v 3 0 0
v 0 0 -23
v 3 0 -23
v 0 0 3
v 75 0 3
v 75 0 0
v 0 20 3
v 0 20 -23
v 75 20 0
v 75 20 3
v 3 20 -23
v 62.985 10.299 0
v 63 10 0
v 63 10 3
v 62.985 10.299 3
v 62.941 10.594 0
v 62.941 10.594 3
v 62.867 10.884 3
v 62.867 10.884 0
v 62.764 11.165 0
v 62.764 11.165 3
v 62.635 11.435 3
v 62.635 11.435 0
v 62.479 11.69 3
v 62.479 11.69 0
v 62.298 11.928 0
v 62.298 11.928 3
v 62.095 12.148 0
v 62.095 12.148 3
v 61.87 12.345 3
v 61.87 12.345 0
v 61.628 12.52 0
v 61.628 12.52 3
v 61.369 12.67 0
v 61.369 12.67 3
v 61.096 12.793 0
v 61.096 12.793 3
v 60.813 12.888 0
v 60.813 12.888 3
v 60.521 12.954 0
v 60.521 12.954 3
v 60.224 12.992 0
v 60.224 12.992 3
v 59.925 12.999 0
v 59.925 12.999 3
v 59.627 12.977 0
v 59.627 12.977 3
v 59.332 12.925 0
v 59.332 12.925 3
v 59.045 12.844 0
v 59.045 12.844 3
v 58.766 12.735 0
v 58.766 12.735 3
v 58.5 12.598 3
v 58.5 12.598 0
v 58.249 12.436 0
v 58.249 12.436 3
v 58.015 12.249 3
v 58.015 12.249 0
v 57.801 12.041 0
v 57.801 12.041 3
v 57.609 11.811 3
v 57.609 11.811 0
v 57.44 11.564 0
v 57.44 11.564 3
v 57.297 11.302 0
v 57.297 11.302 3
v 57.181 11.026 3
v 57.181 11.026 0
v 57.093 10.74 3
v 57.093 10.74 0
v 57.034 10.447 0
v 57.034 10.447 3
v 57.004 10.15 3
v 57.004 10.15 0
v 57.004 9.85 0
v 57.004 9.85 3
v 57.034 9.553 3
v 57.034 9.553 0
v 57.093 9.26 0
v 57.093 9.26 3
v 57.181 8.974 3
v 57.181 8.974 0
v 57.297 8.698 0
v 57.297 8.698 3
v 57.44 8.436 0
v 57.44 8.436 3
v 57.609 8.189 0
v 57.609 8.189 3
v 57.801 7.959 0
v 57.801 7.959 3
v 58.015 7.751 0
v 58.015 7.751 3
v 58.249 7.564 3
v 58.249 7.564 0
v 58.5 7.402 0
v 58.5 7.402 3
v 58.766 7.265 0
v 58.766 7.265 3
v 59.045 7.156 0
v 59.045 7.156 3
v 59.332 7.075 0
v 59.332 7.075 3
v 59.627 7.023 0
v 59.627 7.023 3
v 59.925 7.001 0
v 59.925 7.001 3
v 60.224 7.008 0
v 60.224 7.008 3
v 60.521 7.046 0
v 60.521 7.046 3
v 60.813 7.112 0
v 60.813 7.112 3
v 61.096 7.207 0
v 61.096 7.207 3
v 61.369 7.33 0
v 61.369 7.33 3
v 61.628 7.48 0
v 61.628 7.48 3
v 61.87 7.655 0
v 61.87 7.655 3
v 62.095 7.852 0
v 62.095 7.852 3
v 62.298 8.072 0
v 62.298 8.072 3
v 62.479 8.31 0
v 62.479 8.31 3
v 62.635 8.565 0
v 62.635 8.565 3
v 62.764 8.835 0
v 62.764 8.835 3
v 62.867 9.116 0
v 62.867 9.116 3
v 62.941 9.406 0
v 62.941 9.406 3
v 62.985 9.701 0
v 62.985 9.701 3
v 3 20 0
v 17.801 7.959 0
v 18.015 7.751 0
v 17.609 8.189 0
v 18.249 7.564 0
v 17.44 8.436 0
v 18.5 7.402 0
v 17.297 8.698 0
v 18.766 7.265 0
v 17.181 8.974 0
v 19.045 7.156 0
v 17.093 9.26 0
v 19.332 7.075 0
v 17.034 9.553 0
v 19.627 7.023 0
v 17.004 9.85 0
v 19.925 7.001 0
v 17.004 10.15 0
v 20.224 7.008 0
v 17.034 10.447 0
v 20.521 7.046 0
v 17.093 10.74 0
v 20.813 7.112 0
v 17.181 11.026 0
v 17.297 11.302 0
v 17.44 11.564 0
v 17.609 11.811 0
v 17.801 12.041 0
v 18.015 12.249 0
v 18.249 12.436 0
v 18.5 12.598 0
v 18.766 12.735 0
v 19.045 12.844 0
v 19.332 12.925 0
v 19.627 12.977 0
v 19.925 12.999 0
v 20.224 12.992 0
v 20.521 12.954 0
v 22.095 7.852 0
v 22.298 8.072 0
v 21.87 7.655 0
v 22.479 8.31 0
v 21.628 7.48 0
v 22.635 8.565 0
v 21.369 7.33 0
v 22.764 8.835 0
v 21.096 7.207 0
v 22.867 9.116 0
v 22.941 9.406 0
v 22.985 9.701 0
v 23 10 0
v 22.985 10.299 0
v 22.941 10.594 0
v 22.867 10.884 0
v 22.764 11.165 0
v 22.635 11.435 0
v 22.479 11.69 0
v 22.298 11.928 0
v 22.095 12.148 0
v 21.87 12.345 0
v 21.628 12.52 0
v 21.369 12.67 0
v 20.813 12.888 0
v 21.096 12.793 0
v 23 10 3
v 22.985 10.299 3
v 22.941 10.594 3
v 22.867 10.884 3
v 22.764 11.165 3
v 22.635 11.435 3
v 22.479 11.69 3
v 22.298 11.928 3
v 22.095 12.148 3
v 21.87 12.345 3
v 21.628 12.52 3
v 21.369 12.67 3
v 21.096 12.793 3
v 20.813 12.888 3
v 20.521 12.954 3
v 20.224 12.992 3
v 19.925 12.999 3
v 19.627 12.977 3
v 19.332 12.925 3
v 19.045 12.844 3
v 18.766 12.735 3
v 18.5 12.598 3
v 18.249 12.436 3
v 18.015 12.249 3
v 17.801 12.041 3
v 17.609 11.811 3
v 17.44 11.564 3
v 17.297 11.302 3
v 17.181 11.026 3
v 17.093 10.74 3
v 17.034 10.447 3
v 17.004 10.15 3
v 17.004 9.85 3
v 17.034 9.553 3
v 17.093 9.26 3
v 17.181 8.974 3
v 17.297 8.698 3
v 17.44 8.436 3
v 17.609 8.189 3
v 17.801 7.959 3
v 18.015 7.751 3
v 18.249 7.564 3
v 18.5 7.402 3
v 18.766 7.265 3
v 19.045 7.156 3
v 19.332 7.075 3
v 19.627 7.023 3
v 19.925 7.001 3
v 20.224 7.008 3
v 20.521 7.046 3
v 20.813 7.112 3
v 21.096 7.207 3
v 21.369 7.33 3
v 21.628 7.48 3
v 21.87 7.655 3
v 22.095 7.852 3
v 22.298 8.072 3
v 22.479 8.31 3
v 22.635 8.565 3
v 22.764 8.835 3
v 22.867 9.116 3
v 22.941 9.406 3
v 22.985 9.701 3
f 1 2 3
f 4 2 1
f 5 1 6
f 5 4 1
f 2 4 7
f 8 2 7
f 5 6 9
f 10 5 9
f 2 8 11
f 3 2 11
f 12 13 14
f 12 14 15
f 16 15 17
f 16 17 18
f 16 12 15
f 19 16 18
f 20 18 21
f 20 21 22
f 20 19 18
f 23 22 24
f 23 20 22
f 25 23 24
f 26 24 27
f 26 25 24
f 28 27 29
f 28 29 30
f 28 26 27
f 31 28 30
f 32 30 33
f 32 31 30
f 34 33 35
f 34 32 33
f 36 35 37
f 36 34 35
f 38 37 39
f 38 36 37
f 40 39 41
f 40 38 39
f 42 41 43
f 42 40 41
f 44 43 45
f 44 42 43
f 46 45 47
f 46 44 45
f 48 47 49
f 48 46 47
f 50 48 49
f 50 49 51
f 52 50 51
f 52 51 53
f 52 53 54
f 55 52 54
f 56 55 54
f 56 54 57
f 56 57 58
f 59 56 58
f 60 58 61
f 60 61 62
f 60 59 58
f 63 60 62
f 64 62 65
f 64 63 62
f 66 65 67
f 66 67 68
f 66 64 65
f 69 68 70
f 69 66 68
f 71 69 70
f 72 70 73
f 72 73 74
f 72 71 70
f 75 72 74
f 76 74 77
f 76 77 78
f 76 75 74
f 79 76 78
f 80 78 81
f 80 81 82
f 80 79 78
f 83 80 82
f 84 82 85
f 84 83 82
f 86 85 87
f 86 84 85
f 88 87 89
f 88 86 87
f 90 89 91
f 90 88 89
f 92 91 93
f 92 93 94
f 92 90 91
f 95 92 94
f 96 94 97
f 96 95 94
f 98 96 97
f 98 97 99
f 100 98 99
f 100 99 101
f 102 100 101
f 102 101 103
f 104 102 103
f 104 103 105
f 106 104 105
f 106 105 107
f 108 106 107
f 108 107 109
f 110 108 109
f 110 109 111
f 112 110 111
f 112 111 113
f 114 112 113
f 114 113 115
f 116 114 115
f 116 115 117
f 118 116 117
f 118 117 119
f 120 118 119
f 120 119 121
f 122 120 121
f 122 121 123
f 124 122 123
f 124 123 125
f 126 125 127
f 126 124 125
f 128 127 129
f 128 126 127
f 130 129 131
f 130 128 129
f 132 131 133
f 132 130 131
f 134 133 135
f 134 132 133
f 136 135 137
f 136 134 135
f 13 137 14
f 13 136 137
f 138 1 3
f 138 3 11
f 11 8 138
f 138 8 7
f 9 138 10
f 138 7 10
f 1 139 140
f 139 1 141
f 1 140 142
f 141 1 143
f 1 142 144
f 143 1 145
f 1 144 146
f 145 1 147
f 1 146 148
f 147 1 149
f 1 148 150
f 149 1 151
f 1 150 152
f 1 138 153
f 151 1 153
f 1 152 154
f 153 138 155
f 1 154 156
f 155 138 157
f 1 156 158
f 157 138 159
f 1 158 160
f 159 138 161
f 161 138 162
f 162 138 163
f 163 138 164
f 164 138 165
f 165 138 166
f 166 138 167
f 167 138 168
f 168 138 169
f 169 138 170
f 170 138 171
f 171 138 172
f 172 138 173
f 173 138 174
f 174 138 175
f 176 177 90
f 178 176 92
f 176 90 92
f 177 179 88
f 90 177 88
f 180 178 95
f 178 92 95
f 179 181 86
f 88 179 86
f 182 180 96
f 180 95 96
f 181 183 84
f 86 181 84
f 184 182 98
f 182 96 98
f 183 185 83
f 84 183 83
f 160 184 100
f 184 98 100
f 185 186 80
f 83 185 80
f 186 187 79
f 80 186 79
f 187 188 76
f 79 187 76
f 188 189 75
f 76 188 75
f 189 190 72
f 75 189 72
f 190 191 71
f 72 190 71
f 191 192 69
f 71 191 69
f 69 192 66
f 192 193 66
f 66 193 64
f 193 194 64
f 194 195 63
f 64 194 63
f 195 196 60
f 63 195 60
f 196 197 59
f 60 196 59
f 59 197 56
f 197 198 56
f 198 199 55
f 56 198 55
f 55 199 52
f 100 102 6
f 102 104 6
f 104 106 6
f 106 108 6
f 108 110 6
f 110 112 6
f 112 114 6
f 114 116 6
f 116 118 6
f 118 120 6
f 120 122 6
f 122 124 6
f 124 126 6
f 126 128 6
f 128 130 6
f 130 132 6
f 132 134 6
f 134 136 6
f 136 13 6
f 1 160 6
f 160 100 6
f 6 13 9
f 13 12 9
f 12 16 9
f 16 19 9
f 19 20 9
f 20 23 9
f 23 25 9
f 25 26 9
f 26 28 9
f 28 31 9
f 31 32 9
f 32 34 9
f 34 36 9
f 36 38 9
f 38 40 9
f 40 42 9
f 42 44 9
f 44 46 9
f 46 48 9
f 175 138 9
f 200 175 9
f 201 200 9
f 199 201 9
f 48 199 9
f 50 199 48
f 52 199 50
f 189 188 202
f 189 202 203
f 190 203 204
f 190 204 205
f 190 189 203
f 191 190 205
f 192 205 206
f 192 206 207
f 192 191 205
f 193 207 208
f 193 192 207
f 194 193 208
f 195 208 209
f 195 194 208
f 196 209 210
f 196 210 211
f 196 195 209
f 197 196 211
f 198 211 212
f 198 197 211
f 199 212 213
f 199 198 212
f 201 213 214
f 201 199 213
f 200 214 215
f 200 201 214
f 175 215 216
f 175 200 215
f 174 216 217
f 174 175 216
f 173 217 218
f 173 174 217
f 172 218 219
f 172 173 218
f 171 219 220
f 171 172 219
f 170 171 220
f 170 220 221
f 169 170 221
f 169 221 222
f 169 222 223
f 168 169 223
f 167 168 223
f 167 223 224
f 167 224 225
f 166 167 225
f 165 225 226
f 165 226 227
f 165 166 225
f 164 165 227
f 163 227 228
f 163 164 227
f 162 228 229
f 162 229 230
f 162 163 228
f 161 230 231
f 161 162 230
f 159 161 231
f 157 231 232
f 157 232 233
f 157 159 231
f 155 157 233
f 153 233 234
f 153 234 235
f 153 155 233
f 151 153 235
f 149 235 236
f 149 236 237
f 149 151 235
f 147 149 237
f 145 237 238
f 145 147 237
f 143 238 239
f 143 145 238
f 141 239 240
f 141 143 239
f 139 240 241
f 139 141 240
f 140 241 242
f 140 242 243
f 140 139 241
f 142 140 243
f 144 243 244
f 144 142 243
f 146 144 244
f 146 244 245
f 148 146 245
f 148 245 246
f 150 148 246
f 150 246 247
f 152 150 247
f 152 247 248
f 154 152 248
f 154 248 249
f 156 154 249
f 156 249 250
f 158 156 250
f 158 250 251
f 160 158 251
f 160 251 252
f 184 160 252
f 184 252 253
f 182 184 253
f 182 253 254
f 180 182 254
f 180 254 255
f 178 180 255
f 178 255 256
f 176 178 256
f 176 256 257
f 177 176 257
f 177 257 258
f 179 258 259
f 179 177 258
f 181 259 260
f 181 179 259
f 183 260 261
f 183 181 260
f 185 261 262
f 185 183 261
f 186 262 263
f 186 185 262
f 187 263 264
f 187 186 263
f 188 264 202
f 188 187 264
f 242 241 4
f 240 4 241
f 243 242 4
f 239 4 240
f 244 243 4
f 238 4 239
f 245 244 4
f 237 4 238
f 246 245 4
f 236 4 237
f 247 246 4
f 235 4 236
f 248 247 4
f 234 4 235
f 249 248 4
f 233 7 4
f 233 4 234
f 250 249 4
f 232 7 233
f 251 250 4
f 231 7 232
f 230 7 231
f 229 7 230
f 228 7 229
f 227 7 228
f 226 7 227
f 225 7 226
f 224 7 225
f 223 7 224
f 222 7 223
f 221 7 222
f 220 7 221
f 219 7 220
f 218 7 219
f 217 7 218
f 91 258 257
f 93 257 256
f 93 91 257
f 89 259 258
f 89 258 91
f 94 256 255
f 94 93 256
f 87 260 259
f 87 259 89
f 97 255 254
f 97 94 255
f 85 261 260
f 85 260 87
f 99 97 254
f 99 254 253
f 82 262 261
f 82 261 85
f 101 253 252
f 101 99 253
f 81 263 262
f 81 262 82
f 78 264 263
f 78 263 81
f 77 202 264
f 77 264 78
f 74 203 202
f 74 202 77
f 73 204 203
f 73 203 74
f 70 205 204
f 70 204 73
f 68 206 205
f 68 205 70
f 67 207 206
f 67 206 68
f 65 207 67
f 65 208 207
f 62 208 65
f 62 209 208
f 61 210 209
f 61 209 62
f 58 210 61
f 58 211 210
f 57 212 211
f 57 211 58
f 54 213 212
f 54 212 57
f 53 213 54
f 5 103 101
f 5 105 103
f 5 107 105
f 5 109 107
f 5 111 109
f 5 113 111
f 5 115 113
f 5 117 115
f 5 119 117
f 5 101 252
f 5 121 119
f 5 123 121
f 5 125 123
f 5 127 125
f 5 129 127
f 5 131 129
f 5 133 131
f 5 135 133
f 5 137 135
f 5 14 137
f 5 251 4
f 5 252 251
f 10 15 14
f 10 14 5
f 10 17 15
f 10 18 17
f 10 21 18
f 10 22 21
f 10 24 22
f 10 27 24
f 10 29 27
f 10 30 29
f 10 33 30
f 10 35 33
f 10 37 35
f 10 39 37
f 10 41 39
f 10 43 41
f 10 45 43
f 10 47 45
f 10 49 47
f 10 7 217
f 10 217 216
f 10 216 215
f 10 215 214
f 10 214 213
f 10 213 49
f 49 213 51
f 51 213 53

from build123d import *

# Parameters (mm, degrees)
SKETCH1_W           = 75
SKETCH1_H           = 20
SKETCH1_R           = 3
BOSS_EXTRUDE2_DEPTH = 3
SKETCH1_3_W         = 3
SKETCH1_3_H         = 20
BOSS_EXTRUDE3_DEPTH = 23


with BuildPart() as part:
    # Sketch1 → Boss-Extrude2 (new body)
    with BuildSketch(Plane.XY):
        with Locations((37.5, 10)):
            Rectangle(SKETCH1_W, SKETCH1_H)
        with Locations((60, 10)):
            Circle(SKETCH1_R, mode=Mode.SUBTRACT)
        with Locations((20, 10)):
            Circle(SKETCH1_R, mode=Mode.SUBTRACT)
    extrude(amount=BOSS_EXTRUDE2_DEPTH)

    # Sketch1<3> → Boss-Extrude3 (add)
    with BuildSketch(Plane.XY):
        with Locations((1.5, 10)):
            Rectangle(SKETCH1_3_W, SKETCH1_3_H)
    extrude(amount=-BOSS_EXTRUDE3_DEPTH)


solid = part.part
